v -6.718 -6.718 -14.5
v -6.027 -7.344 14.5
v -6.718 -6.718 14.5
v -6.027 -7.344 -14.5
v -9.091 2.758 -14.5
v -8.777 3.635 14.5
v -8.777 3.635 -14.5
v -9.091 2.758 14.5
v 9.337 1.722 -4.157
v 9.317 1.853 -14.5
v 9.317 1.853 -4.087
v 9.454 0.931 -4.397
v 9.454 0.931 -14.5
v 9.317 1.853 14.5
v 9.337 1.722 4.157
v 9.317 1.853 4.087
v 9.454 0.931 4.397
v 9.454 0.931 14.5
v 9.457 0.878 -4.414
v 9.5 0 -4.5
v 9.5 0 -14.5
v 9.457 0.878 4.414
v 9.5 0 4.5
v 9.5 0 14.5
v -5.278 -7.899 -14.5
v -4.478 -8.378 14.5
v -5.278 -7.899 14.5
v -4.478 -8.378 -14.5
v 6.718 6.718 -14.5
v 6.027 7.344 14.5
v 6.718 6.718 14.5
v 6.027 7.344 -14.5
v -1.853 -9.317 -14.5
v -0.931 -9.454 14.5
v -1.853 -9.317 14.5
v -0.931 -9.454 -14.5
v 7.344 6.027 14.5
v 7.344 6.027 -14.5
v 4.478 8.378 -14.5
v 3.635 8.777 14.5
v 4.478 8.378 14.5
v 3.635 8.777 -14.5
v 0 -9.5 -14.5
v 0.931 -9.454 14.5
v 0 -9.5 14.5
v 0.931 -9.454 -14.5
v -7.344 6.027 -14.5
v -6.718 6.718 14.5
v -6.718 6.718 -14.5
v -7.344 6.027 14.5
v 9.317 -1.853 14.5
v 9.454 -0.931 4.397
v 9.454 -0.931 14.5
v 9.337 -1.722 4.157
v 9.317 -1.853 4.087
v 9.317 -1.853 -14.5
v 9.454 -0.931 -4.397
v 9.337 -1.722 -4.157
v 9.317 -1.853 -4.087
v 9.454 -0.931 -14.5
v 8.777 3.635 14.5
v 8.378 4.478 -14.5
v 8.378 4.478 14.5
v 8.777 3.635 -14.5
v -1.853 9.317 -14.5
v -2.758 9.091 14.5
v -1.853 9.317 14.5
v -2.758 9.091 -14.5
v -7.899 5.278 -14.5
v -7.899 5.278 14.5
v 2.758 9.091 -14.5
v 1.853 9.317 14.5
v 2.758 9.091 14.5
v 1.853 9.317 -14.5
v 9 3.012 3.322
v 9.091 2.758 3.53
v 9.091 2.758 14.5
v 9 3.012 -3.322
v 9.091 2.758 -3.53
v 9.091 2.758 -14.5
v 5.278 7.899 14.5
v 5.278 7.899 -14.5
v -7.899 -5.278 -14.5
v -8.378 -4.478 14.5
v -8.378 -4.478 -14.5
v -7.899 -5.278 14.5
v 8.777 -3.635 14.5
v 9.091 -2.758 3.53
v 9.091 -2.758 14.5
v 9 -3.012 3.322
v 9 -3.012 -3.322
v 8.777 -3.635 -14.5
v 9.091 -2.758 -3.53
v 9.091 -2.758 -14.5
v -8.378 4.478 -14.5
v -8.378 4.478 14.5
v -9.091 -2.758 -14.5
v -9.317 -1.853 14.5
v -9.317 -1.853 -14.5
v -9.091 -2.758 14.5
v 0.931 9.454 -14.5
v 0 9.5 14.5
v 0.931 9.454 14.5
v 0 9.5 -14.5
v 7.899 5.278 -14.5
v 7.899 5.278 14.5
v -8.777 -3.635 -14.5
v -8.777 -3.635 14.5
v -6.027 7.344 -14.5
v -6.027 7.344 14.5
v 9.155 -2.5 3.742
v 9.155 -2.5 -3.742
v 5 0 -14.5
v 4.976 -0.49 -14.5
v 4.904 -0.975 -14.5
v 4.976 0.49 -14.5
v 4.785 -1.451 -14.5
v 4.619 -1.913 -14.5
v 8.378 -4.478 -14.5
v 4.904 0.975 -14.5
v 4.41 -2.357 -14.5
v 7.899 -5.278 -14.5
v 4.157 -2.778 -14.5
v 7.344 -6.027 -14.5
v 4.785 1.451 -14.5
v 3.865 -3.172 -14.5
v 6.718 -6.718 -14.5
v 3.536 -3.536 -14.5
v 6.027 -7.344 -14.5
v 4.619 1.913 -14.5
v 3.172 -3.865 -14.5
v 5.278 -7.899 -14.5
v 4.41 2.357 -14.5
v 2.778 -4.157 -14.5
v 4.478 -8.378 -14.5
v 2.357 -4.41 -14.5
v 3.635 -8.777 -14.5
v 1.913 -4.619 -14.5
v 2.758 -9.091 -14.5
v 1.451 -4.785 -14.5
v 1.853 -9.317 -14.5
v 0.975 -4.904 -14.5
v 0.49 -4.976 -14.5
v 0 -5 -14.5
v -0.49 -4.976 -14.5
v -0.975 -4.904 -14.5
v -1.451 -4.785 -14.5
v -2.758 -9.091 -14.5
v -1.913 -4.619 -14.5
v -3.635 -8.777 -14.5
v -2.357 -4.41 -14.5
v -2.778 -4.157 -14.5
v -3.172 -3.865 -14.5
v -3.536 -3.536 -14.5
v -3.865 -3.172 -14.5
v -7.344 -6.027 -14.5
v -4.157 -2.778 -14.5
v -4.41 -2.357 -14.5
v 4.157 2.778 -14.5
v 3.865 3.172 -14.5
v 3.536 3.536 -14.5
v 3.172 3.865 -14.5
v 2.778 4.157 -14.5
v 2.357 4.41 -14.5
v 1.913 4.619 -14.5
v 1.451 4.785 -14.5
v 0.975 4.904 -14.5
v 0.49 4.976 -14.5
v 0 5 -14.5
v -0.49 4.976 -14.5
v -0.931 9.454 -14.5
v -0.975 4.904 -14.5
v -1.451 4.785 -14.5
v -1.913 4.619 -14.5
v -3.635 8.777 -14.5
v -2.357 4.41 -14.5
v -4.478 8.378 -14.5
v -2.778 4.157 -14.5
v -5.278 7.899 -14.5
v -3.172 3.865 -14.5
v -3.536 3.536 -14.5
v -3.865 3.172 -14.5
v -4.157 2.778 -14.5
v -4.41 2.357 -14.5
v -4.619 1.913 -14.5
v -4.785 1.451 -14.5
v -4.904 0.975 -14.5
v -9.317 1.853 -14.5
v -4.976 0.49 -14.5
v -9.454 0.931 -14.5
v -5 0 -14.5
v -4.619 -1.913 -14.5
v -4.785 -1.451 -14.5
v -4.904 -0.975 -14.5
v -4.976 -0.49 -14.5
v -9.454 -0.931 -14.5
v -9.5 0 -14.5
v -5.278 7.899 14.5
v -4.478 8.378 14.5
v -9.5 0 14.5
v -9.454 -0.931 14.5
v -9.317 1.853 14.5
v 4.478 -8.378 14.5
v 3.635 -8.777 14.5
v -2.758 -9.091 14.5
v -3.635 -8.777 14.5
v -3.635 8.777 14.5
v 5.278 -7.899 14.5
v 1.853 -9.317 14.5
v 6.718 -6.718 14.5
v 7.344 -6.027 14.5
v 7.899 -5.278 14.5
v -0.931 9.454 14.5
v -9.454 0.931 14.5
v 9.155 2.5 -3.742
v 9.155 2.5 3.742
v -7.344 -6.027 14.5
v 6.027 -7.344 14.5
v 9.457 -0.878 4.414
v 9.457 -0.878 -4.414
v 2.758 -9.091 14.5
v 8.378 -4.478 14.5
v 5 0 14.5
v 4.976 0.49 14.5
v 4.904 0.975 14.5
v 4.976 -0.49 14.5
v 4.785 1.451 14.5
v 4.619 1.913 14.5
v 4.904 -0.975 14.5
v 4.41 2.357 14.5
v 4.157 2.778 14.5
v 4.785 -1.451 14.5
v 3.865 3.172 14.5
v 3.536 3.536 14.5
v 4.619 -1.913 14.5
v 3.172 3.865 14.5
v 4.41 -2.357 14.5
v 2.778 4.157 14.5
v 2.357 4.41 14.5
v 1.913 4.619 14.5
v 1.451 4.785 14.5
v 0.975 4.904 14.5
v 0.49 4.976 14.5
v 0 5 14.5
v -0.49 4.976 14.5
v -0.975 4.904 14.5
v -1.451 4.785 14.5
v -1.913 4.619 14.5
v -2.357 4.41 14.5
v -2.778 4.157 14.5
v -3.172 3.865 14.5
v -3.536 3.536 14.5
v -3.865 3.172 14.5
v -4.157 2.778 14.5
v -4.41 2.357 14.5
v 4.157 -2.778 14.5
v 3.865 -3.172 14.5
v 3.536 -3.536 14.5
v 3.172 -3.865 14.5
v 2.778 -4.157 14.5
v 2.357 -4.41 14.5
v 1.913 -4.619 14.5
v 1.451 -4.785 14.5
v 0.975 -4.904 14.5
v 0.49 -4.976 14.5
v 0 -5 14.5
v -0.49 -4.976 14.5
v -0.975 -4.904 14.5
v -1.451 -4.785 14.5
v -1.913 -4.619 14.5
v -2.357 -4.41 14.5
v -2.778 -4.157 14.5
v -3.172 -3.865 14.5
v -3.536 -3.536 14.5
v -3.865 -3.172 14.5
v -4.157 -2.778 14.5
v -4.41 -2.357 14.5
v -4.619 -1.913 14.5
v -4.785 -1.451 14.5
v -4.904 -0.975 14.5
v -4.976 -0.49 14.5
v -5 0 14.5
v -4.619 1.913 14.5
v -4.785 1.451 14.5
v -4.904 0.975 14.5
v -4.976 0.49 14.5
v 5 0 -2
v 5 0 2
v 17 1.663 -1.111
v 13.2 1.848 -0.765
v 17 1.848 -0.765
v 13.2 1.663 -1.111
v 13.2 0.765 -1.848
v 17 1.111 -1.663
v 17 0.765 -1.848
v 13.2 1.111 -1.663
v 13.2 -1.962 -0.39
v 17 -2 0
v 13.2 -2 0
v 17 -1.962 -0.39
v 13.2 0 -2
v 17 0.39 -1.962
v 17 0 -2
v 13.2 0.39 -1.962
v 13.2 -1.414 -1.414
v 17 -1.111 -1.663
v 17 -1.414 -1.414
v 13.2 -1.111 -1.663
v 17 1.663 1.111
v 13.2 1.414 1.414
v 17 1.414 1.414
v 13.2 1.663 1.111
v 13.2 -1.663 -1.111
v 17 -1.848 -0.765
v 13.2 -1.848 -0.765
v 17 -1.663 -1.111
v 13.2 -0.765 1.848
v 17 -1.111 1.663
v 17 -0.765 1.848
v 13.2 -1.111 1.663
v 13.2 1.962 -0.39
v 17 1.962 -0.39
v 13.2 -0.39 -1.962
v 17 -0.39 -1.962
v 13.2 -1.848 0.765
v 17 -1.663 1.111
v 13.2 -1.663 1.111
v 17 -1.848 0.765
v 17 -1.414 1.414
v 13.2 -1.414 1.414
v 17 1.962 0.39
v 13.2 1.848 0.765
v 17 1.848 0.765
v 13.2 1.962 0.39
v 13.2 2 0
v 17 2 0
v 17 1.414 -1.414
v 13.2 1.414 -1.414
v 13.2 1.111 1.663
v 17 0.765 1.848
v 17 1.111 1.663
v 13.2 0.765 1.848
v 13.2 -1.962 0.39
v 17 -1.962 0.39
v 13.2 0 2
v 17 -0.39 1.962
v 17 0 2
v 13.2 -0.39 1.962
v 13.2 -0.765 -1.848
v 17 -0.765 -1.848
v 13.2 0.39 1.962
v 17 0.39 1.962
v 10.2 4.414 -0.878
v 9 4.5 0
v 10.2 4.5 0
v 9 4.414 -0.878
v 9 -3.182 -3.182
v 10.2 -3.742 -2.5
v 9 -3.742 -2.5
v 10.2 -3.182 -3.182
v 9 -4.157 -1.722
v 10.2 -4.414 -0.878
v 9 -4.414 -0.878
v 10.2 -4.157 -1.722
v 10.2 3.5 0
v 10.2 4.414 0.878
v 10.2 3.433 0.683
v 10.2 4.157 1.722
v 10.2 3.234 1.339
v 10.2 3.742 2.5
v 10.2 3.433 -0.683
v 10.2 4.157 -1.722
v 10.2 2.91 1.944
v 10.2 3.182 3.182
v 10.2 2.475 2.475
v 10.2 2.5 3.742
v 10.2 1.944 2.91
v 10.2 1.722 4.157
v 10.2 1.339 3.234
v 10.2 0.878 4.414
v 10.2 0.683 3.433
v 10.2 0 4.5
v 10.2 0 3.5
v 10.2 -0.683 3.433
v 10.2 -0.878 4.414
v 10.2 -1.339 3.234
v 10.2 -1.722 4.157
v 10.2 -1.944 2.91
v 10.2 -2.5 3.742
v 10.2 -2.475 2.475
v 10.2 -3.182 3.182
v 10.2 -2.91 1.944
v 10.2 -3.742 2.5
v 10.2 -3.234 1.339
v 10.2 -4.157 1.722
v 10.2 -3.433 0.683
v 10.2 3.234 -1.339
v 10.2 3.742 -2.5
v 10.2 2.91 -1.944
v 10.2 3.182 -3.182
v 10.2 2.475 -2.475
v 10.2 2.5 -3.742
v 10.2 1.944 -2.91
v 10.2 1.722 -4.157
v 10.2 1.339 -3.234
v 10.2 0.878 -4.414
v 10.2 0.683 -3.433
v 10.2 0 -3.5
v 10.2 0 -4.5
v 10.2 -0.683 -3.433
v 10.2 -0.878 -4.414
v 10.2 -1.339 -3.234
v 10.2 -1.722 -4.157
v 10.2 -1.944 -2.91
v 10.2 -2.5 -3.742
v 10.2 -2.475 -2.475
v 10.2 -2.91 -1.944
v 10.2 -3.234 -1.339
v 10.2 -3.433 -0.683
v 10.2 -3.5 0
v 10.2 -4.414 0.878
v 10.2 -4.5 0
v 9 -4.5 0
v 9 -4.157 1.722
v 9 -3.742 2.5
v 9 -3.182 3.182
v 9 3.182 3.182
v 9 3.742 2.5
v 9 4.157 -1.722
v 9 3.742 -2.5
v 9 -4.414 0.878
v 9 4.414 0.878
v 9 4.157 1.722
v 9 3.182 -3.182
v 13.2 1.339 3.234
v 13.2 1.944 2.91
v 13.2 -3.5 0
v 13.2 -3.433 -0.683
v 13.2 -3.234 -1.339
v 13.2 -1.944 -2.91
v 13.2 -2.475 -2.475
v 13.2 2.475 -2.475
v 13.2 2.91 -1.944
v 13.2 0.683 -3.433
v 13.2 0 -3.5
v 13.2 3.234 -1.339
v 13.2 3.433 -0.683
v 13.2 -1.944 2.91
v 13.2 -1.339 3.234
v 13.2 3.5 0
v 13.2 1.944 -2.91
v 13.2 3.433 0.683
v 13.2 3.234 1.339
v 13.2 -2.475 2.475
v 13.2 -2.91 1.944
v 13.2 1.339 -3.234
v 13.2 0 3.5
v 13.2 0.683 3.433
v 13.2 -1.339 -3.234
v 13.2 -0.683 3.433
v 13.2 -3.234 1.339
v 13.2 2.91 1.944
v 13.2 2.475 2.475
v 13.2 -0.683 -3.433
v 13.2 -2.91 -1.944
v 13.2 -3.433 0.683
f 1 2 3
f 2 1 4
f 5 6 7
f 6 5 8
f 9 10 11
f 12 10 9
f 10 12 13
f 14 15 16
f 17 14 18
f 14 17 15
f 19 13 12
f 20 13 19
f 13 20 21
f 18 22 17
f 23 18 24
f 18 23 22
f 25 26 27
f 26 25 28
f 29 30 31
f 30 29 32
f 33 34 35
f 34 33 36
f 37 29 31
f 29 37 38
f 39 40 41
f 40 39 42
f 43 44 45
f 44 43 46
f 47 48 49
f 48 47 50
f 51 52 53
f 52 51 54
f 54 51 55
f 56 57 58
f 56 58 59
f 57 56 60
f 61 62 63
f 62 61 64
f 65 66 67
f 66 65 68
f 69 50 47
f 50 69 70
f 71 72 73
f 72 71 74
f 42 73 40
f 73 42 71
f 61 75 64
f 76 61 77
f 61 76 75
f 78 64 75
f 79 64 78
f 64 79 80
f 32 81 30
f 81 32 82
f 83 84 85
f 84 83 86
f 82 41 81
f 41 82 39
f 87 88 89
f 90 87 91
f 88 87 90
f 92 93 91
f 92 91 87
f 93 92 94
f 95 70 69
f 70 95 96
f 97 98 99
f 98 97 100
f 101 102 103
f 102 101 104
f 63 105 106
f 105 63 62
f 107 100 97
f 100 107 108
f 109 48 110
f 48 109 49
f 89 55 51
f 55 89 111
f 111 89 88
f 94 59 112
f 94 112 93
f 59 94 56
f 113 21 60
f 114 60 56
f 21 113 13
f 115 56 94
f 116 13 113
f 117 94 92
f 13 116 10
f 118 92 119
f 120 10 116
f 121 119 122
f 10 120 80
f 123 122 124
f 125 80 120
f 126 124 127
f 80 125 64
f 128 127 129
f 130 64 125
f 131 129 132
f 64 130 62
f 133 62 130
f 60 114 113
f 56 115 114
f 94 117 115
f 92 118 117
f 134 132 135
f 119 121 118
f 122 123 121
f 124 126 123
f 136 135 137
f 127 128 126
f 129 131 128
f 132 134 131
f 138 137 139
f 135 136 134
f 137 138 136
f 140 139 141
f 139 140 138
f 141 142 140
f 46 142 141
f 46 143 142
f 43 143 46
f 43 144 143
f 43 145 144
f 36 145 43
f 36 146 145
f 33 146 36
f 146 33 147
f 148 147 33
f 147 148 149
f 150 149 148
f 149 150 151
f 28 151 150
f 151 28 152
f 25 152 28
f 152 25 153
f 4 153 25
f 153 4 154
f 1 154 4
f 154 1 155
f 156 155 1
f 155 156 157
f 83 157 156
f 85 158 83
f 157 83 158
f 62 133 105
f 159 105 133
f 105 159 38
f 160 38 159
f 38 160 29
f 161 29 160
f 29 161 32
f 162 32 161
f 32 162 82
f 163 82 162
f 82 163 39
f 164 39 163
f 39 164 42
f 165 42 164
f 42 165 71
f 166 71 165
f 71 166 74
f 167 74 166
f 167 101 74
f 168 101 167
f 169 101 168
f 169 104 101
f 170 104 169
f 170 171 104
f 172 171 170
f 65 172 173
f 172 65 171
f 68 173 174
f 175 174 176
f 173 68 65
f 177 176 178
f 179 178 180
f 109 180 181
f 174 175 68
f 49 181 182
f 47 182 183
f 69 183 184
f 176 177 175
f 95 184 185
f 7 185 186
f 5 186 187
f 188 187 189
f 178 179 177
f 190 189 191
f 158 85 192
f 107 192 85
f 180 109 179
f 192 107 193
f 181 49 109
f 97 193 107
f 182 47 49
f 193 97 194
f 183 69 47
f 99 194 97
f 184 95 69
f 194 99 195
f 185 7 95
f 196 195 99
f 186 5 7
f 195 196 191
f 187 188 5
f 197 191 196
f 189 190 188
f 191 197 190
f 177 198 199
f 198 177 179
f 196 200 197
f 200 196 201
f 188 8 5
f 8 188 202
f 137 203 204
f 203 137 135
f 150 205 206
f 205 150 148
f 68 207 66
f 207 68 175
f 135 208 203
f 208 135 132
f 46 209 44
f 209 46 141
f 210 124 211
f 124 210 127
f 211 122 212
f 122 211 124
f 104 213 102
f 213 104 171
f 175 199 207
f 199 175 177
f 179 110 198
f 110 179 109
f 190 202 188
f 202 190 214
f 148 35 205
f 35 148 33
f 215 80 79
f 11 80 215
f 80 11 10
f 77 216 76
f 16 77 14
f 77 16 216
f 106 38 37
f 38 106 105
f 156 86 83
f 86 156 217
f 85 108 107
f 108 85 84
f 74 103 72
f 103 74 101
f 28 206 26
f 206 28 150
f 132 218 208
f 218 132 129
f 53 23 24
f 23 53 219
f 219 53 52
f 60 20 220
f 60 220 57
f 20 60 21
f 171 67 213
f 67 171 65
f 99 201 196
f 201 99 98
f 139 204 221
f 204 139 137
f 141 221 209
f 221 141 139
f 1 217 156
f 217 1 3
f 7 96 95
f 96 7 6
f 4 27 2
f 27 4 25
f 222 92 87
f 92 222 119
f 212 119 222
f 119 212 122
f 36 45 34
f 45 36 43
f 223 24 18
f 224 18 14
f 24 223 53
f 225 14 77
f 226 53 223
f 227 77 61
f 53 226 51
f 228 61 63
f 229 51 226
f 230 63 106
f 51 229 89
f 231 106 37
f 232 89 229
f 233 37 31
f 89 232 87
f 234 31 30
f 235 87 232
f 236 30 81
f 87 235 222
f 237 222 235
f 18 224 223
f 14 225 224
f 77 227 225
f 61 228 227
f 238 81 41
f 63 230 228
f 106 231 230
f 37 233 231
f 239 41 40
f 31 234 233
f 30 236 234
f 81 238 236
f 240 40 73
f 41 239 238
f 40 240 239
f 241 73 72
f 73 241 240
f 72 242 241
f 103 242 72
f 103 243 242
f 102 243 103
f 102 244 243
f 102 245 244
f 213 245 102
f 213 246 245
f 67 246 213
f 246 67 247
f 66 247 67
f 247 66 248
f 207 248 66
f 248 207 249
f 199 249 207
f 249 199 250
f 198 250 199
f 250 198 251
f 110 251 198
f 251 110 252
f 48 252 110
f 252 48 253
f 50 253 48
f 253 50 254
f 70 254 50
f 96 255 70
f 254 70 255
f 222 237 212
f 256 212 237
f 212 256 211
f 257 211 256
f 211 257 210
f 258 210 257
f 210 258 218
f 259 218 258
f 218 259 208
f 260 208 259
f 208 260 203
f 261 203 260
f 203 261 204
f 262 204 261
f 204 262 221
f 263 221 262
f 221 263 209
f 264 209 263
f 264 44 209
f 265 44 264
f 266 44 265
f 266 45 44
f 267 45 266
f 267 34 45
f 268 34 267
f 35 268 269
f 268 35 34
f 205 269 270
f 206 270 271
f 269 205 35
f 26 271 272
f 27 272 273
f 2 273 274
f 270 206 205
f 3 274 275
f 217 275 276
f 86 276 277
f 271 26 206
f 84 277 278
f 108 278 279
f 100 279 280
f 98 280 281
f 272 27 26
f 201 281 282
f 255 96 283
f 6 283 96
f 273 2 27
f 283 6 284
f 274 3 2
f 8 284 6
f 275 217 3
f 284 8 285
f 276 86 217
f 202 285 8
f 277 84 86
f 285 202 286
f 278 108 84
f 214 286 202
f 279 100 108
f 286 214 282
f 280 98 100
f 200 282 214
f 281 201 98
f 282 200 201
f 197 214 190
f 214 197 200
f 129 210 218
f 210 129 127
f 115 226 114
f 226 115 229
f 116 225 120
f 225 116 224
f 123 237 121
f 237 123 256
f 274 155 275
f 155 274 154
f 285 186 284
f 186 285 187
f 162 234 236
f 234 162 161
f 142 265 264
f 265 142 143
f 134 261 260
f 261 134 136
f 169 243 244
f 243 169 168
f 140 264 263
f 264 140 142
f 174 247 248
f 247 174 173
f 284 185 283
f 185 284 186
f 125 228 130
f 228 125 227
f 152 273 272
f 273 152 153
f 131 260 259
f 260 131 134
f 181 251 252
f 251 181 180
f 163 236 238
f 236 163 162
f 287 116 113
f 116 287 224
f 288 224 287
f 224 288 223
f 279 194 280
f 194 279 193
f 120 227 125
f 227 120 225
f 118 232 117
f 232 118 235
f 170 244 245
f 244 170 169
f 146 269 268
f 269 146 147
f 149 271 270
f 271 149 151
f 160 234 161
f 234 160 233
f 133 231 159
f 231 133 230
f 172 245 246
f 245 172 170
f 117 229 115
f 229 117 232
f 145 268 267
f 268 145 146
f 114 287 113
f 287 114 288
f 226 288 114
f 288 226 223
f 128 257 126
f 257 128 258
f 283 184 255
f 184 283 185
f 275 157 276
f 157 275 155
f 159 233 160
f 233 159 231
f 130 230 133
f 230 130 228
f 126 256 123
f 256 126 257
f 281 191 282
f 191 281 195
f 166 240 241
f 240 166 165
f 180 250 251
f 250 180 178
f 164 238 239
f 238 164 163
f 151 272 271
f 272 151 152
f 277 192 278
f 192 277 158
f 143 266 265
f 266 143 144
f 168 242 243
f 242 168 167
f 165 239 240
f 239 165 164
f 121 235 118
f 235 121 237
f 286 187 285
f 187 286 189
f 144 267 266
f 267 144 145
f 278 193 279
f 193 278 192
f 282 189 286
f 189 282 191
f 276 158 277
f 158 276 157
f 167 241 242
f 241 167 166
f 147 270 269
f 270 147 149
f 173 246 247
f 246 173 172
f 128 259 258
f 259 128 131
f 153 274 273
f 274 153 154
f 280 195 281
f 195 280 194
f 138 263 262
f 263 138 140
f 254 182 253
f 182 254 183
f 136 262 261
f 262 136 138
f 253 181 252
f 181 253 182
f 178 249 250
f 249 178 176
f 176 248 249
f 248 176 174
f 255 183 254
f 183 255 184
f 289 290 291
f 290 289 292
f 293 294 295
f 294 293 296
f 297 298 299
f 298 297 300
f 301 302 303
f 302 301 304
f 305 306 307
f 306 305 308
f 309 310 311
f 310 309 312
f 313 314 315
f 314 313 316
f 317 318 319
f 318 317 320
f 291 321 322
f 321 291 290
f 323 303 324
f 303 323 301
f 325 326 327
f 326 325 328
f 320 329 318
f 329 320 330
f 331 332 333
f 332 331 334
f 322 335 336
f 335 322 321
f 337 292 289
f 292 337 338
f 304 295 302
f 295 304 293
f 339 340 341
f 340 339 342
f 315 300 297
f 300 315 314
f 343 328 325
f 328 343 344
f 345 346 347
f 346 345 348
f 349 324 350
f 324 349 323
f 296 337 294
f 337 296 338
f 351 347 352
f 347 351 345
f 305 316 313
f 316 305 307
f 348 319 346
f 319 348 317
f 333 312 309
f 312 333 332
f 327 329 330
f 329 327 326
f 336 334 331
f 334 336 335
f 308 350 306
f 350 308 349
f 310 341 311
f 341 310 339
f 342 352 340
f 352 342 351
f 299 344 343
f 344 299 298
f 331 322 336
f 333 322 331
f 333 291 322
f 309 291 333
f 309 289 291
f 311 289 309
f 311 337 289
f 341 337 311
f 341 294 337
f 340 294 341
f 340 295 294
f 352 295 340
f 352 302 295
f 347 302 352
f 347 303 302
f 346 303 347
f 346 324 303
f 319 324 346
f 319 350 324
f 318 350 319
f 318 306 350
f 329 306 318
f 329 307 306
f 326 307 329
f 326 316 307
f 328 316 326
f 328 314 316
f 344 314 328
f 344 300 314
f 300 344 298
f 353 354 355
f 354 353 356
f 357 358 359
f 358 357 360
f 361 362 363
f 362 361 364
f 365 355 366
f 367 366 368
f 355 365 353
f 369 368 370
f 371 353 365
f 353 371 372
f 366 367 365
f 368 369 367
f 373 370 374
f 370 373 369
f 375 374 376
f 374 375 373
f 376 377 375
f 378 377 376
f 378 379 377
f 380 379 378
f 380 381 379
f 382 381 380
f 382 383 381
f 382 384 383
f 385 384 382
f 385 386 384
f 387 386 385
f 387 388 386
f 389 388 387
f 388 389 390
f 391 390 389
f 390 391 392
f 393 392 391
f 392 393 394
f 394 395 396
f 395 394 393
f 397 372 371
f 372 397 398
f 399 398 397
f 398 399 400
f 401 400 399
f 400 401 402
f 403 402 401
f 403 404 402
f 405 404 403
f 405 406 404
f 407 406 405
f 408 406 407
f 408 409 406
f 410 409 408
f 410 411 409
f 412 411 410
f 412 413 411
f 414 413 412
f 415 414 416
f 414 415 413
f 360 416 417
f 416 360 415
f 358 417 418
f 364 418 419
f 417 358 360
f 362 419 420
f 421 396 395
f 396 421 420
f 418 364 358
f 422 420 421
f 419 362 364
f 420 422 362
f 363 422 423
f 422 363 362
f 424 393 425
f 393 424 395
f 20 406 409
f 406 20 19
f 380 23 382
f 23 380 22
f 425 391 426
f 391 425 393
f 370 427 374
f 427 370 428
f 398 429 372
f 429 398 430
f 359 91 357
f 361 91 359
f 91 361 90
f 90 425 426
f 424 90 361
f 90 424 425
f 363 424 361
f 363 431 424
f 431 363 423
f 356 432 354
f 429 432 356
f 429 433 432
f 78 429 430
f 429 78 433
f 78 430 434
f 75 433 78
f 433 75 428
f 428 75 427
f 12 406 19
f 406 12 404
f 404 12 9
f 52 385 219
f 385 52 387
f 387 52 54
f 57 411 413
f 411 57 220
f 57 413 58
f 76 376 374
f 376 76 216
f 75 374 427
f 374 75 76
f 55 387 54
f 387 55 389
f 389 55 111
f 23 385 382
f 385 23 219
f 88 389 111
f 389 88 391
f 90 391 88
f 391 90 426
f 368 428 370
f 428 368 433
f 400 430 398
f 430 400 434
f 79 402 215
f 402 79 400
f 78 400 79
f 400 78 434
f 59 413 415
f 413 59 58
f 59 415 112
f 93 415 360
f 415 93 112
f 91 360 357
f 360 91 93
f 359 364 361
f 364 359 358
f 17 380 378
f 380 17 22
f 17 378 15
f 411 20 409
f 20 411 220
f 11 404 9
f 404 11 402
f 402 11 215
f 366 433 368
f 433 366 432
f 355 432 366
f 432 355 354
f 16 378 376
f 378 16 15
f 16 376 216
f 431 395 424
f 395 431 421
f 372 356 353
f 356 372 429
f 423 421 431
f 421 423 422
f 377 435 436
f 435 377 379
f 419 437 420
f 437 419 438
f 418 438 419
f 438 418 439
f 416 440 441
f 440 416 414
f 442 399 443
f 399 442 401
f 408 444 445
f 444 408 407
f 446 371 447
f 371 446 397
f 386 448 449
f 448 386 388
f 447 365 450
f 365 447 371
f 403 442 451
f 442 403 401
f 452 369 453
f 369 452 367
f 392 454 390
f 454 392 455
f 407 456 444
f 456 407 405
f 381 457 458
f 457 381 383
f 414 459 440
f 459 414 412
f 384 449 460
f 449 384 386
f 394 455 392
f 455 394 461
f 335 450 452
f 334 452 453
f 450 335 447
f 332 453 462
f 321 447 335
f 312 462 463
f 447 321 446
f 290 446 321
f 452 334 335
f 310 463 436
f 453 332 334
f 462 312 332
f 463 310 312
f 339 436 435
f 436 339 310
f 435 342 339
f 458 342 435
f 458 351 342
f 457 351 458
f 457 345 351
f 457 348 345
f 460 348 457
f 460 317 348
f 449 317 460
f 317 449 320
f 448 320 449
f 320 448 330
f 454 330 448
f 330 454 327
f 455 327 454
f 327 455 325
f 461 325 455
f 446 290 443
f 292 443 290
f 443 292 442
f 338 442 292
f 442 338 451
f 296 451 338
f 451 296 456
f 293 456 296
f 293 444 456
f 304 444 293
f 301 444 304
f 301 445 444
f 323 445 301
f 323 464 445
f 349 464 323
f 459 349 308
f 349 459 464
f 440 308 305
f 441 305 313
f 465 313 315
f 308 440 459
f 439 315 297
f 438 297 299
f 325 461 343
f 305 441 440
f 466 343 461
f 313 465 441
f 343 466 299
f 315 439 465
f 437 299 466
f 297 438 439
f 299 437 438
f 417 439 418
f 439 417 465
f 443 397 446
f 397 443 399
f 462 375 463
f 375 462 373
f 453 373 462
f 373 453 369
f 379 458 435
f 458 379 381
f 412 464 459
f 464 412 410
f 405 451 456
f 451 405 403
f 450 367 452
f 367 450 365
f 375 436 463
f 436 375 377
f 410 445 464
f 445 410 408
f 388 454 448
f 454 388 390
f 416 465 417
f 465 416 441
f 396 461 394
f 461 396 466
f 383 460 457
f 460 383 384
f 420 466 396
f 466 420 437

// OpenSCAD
// Parameters
bore_diameter_mm = 10; //[5:20:0.1]
outer_diameter_mm = 19; //[10:38:0.1]
length_mm = 29; //[15:58:0.1]
bore_radius_mm = 5; //[2.5:10:0.1]
outer_radius_mm = 9.5; //[5:19:0.1]
eps_mm = 0.5; //[0.2:2:0.1]
screw_shank_radius_mm = 2; //[1:4:0.1]
screw_head_radius_mm = 3.5; //[2:7:0.1]
screw_head_height_mm = 3; //[1.5:6:0.1]
washer_radius_mm = 4.5; //[2.5:9:0.1]
washer_thickness_mm = 1.2; //[0.6:3:0.1]
screw_length_mm = 12; //[6:24:0.5]

// Linear Bearing - complete geometry
module linear_bearing() {
  color("DimGray") {
    difference() {
      // Outer casing
      cylinder(h=length_mm, r=outer_radius_mm, center=true, $fn=64);
      // Inner bore
      cylinder(h=length_mm + 2*eps_mm, r=bore_radius_mm, center=true, $fn=64);
    }
  }
}

// Screw and Washer - complete geometry
module screw_and_washer() {
  color("Silver") {
    union() {
      // Screw shank
      translate([outer_radius_mm + screw_shank_radius_mm - eps_mm, 0, 0])
        rotate([0, 90, 0])
        cylinder(h=screw_length_mm, r=screw_shank_radius_mm, center=true, $fn=32);
      // Washer
      translate([outer_radius_mm + washer_thickness_mm/2 - eps_mm, 0, 0])
        rotate([0, 90, 0])
        cylinder(h=washer_thickness_mm, r=washer_radius_mm, center=true, $fn=32);
      // Screw head
      translate([outer_radius_mm + washer_thickness_mm + screw_head_height_mm/2 - eps_mm, 0, 0])
        rotate([0, 90, 0])
        cylinder(h=screw_head_height_mm, r=screw_head_radius_mm, center=true, $fn=32);
    }
  }
}

// Assembly
module assembly() {
  linear_bearing();
  screw_and_washer();
}

assembly();
